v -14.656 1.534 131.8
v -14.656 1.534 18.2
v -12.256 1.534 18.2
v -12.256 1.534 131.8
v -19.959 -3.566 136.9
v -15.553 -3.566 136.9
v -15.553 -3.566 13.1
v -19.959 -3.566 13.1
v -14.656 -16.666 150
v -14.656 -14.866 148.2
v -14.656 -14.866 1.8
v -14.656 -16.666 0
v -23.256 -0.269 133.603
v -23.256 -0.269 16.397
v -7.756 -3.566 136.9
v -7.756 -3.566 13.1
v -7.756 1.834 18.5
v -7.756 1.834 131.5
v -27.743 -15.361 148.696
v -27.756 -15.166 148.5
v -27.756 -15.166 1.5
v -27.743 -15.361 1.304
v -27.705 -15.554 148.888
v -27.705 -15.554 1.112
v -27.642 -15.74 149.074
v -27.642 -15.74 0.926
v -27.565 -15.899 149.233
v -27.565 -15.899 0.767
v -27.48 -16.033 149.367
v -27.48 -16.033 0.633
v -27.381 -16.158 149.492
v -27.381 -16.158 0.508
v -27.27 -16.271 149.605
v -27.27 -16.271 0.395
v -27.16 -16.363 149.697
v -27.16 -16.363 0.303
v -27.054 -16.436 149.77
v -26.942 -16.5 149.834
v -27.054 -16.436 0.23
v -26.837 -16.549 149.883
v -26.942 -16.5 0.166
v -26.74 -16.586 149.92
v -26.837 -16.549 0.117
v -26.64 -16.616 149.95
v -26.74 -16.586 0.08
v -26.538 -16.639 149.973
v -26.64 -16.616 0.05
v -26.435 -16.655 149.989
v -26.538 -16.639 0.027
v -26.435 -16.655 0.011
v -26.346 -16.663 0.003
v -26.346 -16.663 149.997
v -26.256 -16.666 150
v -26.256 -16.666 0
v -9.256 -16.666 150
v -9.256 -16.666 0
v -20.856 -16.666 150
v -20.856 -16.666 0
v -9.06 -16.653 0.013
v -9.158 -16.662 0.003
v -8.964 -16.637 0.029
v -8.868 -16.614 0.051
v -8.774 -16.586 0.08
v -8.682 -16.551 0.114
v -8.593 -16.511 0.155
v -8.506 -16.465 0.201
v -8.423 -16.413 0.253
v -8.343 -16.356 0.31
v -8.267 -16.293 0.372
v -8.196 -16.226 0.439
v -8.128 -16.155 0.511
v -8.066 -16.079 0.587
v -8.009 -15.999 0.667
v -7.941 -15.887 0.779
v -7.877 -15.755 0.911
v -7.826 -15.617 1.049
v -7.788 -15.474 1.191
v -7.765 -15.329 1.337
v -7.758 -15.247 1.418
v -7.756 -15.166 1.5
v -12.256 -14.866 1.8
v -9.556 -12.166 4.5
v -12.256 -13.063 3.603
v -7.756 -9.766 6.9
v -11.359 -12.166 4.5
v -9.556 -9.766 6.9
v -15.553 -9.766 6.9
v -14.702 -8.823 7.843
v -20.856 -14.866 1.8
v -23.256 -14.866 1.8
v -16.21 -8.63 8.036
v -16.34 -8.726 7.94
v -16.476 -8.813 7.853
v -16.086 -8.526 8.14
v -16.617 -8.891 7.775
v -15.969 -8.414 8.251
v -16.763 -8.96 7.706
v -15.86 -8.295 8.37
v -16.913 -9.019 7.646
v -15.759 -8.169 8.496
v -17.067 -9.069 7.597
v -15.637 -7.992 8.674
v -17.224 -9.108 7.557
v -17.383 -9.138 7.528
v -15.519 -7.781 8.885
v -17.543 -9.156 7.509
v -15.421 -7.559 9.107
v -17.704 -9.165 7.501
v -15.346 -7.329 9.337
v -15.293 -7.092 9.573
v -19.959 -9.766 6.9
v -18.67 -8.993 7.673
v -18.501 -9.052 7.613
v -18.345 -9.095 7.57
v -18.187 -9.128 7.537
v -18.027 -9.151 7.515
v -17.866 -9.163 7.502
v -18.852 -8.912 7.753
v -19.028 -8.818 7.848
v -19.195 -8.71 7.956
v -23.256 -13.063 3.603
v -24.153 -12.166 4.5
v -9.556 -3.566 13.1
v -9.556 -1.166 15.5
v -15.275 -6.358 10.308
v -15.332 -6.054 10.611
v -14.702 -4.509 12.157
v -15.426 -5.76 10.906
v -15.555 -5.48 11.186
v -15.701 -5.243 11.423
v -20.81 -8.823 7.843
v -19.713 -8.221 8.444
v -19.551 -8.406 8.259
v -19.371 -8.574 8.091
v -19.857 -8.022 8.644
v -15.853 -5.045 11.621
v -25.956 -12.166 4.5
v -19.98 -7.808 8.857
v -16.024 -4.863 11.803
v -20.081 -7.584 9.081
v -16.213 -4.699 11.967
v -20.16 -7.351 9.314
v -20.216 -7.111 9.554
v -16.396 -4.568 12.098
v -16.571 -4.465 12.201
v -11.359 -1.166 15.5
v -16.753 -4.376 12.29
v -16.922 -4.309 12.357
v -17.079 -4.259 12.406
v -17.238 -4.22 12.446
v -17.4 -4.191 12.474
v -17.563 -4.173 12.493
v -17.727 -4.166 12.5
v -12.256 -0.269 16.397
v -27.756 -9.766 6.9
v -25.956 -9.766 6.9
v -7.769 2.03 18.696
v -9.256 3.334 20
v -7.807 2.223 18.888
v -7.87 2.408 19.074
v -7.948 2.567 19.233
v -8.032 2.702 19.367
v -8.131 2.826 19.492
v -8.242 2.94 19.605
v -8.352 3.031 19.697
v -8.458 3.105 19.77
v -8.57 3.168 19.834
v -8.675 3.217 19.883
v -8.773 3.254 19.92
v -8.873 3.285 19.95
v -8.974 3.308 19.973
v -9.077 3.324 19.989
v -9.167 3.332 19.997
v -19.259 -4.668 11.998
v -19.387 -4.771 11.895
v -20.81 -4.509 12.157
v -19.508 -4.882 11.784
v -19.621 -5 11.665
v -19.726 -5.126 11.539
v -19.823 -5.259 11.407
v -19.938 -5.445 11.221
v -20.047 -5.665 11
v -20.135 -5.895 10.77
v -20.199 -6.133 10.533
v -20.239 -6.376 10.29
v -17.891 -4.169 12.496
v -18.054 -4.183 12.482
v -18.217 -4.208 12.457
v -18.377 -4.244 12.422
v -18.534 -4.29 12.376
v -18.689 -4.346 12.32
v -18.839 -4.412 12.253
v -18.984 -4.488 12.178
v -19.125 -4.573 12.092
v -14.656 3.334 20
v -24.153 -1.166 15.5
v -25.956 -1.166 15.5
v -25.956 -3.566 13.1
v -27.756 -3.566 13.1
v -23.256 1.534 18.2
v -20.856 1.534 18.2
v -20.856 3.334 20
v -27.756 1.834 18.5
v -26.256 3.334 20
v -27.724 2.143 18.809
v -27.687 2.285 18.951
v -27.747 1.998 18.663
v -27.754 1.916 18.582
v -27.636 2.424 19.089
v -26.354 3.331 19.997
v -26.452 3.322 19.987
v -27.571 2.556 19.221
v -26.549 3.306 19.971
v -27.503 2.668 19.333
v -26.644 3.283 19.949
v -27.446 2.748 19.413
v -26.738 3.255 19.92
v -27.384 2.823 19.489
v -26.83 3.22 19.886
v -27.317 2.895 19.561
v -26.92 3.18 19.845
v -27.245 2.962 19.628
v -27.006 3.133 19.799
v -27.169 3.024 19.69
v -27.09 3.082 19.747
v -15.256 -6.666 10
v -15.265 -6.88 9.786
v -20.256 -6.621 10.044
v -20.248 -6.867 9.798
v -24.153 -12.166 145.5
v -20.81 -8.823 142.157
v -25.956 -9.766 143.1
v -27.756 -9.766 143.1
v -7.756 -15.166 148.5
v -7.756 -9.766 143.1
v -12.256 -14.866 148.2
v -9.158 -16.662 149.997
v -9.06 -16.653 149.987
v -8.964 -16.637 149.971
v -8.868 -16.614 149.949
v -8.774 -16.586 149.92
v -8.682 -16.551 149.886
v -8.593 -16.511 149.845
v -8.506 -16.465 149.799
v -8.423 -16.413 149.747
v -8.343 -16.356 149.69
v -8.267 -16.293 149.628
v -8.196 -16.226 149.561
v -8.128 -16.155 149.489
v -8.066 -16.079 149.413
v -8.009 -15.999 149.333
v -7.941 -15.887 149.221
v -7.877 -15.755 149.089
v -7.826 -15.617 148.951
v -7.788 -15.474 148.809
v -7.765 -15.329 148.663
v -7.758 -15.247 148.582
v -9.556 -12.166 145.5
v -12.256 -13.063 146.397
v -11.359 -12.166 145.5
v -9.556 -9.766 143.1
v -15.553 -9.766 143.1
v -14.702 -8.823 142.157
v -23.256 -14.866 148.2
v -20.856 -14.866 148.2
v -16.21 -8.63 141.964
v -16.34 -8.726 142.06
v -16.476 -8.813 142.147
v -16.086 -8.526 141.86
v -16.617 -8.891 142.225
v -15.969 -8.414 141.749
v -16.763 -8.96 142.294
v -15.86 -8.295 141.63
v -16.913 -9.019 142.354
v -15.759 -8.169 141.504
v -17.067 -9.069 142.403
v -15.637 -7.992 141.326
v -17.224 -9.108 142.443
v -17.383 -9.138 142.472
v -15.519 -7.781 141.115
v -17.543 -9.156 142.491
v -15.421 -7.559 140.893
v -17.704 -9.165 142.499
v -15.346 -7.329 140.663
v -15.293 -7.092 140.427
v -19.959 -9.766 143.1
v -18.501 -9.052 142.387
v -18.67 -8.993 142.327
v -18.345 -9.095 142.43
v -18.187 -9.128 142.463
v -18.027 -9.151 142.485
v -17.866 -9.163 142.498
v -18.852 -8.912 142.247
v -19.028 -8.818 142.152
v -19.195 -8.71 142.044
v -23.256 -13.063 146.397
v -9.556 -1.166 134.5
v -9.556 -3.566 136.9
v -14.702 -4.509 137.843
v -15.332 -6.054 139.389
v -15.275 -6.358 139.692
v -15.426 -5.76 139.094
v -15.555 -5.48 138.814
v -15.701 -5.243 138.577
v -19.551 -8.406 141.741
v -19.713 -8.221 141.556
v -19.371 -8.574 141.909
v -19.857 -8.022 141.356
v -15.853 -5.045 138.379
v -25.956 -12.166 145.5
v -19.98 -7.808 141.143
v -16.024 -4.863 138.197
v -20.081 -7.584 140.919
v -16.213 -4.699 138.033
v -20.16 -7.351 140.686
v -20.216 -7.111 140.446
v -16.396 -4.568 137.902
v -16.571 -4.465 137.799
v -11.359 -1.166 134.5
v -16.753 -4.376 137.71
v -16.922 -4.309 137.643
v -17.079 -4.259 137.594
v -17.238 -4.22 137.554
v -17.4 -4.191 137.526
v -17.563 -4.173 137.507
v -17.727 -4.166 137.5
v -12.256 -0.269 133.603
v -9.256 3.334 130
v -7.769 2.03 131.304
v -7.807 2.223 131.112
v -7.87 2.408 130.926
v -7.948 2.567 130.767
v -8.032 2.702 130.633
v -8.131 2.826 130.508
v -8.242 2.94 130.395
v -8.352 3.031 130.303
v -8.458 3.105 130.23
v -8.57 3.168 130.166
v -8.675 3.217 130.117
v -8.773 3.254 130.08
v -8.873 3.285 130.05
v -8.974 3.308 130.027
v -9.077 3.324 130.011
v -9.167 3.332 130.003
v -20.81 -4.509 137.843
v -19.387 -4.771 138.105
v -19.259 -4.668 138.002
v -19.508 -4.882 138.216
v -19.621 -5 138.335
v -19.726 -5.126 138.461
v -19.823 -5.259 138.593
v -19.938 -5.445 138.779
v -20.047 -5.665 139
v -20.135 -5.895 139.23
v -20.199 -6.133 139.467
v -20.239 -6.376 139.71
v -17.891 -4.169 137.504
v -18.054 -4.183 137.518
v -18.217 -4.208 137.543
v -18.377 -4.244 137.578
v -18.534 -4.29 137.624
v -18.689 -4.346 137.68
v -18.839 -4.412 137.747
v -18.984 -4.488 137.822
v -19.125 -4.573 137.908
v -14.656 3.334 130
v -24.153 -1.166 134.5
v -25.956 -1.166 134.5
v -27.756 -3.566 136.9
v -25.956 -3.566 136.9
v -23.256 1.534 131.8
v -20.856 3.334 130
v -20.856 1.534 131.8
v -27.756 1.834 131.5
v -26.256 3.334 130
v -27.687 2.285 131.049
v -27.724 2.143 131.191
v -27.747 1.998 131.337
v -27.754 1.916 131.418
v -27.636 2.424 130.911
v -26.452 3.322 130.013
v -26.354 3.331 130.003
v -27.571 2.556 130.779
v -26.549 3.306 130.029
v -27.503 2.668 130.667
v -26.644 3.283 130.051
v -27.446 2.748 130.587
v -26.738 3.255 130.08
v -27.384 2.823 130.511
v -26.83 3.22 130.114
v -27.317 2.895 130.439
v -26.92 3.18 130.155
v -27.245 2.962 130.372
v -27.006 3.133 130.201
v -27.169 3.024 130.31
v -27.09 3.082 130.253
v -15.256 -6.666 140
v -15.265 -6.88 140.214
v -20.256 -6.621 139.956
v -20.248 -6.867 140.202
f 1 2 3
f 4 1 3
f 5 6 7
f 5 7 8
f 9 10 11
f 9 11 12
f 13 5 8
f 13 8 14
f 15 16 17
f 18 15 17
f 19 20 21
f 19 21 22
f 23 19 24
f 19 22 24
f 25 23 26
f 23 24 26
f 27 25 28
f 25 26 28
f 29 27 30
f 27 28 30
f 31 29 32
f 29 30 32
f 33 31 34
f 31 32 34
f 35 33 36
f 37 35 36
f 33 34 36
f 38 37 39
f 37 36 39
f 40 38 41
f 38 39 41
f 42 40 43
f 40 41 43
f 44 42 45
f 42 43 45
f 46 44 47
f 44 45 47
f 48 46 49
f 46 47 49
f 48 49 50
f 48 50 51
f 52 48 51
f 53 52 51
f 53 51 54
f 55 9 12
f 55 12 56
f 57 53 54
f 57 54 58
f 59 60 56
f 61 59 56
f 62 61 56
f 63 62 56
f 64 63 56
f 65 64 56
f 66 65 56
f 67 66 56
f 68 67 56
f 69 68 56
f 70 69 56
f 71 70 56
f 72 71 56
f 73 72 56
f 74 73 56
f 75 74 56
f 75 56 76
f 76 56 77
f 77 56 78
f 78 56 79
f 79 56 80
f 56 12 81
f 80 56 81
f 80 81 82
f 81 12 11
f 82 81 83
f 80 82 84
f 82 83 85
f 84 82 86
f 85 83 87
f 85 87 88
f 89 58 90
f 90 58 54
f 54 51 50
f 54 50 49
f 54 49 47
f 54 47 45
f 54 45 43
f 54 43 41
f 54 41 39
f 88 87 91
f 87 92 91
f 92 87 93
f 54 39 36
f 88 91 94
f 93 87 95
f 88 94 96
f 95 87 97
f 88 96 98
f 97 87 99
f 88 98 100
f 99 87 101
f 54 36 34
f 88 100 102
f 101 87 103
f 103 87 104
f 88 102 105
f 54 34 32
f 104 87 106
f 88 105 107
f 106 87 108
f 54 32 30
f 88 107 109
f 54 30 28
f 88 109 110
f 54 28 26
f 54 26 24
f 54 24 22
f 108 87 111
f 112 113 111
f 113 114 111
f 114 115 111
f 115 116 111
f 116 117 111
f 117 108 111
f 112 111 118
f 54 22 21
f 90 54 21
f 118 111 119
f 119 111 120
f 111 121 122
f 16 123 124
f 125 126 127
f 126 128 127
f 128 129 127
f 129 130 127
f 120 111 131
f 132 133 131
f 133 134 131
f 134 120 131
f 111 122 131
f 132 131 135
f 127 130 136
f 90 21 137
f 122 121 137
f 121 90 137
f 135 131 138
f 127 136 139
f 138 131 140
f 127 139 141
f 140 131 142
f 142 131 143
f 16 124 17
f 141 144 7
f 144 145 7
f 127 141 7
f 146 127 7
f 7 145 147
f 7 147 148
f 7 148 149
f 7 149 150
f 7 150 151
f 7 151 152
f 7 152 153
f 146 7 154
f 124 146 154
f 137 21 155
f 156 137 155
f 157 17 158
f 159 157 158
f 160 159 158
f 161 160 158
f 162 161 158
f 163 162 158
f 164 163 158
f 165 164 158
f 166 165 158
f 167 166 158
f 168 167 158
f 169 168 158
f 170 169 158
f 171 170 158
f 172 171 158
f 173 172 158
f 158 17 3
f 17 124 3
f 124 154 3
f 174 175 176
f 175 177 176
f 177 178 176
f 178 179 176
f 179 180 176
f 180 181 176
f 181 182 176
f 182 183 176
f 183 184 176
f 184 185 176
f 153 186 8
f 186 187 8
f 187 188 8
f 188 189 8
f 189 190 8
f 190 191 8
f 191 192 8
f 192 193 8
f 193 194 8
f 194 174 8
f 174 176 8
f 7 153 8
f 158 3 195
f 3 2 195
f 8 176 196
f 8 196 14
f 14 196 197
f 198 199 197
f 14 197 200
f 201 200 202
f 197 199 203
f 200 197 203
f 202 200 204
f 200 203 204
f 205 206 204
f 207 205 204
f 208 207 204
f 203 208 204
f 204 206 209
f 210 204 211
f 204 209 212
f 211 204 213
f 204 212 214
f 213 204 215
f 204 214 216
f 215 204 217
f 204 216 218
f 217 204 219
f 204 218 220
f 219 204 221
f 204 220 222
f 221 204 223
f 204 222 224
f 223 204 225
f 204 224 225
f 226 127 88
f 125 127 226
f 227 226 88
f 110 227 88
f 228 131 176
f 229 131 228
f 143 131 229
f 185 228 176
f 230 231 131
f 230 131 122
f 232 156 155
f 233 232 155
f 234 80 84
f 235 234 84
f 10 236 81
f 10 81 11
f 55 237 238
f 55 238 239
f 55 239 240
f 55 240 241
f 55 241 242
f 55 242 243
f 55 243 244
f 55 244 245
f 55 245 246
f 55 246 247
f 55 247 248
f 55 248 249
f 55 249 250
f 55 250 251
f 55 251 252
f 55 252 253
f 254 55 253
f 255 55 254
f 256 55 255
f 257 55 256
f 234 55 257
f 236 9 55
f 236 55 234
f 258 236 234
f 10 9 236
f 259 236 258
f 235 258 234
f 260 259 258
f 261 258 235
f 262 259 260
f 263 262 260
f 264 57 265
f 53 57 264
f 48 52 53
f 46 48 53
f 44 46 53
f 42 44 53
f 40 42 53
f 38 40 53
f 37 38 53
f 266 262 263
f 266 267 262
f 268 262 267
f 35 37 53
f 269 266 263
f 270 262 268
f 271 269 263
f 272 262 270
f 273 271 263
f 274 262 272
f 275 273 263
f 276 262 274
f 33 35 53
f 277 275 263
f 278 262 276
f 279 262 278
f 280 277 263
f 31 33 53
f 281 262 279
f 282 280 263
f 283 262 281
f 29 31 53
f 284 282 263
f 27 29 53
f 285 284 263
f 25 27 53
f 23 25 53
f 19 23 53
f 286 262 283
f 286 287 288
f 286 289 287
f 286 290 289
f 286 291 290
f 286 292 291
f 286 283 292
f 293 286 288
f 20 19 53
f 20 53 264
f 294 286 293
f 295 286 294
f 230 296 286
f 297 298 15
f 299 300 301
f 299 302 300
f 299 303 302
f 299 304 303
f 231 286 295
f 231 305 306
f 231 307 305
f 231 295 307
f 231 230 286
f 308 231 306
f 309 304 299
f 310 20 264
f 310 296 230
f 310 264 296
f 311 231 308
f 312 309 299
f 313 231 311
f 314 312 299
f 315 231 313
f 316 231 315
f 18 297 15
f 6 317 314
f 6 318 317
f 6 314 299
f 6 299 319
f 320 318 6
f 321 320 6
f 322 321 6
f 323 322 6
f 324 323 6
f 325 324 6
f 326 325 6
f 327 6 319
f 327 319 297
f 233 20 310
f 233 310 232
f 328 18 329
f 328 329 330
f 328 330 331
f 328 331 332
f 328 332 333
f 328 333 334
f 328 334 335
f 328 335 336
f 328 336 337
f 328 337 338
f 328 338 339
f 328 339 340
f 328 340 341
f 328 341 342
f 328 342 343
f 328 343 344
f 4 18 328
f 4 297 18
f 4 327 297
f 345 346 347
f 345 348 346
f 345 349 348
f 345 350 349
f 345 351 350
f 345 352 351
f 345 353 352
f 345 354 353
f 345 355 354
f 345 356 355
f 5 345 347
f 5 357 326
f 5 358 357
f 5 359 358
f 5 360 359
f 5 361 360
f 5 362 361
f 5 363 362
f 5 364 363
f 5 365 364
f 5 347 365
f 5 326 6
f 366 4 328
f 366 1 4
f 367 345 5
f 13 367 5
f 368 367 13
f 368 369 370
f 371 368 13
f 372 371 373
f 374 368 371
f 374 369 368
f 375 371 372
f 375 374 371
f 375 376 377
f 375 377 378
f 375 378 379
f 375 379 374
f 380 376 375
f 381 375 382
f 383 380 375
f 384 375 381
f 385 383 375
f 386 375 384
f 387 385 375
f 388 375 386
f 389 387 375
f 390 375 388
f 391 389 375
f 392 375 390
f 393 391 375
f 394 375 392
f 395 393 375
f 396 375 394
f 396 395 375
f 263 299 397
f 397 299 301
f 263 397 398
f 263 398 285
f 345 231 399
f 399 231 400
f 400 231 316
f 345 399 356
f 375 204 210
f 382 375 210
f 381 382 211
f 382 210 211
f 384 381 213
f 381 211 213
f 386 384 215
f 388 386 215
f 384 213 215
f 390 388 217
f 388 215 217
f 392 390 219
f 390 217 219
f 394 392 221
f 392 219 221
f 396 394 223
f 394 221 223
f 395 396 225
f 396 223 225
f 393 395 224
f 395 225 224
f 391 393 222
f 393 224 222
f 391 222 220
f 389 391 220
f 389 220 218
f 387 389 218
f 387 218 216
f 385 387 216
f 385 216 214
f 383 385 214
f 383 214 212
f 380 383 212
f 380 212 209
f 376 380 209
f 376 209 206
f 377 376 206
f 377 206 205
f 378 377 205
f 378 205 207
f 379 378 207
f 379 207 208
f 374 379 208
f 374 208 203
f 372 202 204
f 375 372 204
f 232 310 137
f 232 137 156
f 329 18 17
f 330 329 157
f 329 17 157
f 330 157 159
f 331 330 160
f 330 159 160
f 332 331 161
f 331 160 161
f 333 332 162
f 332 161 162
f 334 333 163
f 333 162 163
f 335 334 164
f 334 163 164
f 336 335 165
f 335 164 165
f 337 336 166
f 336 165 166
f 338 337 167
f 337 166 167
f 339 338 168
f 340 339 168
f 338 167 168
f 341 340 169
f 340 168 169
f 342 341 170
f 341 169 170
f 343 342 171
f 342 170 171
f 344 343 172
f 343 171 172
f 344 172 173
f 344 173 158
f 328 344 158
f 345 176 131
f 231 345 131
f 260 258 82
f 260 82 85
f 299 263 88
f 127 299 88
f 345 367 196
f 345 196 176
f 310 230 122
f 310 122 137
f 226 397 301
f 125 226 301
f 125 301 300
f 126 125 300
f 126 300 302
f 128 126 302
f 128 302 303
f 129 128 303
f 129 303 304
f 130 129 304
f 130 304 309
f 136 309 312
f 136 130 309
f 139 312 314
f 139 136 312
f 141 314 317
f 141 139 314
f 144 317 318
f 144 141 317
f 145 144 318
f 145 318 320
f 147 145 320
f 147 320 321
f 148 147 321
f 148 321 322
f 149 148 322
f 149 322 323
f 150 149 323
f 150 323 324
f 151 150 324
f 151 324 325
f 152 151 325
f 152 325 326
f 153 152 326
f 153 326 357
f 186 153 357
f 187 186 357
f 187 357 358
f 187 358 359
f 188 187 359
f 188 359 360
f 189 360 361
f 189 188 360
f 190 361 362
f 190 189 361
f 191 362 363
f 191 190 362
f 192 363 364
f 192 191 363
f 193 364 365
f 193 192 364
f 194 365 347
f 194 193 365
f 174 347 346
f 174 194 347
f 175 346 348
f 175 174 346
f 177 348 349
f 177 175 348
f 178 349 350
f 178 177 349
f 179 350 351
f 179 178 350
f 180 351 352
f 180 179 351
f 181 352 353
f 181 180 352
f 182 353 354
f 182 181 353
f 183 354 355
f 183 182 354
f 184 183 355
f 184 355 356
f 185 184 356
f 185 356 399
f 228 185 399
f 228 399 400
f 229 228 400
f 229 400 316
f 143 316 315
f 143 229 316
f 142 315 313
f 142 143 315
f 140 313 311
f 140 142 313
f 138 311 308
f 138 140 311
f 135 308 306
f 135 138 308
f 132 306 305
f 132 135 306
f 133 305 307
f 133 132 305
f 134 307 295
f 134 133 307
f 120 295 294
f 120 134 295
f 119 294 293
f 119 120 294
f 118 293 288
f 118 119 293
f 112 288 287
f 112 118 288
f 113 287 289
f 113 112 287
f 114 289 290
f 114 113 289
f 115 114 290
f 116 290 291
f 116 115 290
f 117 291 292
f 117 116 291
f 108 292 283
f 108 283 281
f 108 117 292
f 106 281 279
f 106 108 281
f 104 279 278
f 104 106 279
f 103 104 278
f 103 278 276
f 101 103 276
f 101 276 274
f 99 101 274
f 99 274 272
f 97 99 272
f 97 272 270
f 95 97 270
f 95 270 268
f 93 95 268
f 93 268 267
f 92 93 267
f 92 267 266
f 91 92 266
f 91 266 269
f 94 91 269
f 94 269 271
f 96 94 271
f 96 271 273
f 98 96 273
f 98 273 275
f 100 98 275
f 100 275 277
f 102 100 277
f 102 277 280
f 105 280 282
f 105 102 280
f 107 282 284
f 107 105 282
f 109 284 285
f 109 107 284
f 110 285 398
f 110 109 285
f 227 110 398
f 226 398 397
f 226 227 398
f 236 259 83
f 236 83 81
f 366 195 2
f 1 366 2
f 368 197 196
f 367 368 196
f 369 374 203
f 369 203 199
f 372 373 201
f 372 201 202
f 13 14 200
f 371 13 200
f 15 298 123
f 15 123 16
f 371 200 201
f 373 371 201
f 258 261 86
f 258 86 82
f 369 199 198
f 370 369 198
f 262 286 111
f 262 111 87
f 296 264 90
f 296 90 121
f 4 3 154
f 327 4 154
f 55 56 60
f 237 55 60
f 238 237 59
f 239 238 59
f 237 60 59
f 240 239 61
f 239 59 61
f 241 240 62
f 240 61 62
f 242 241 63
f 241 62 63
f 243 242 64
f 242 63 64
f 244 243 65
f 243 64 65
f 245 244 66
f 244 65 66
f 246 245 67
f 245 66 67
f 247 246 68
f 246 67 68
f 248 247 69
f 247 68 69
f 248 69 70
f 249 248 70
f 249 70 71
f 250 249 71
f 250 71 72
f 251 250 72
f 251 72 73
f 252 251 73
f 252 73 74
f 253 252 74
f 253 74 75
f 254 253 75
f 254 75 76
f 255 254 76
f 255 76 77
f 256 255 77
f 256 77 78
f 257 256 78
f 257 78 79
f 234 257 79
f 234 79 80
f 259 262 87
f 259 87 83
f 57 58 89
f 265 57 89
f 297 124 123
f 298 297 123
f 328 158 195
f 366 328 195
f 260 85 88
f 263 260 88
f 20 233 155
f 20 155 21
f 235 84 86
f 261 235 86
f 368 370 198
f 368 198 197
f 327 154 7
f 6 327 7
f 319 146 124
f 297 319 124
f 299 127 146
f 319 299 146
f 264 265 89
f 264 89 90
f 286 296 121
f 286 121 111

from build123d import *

# Parameters (mm, degrees)
SKETCH_1_R          = 2.5
EXTRUDE_1_DEPTH     = 150
CUT_EXTRUDE_1_DEPTH = 153.242379078


with BuildPart() as part:
    # 草图1 → 凸台-拉伸1 (new body)
    with BuildSketch(Plane.XY):
        with BuildLine():
            Line((-25.95624704, -9.765592916), (-27.75624704, -9.765592916))
            Line((-27.75624704, -9.765592916), (-27.75624704, -15.165592916))
            ThreePointArc((-27.75624704, -15.165592916), (-27.316907212, -16.226253087), (-26.25624704, -16.665592916))
            Line((-26.25624704, -16.665592916), (-20.85624704, -16.665592916))
            Line((-20.85624704, -16.665592916), (-20.85624704, -14.865592916))
            Line((-20.85624704, -14.865592916), (-23.25624704, -14.865592916))
            Line((-23.25624704, -14.865592916), (-23.25624704, -13.062643071))
            Line((-23.25624704, -13.062643071), (-19.959196885, -9.765592916))
            Line((-19.959196885, -9.765592916), (-15.553297195, -9.765592916))
            Line((-15.553297195, -9.765592916), (-12.25624704, -13.062643071))
            Line((-12.25624704, -13.062643071), (-12.25624704, -14.865592916))
            Line((-12.25624704, -14.865592916), (-14.65624704, -14.865592916))
            Line((-14.65624704, -14.865592916), (-14.65624704, -16.665592916))
            Line((-14.65624704, -16.665592916), (-9.25624704, -16.665592916))
            ThreePointArc((-9.25624704, -16.665592916), (-8.195586868, -16.226253087), (-7.75624704, -15.165592916))
            Line((-7.75624704, -15.165592916), (-7.75624704, -9.765592916))
            Line((-7.75624704, -9.765592916), (-9.55624704, -9.765592916))
            Line((-9.55624704, -9.765592916), (-9.55624704, -12.165592916))
            Line((-9.55624704, -12.165592916), (-11.359196885, -12.165592916))
            Line((-11.359196885, -12.165592916), (-14.70212002, -8.822669781))
            Line((-14.70212002, -8.822669781), (-14.70212002, -4.50851605))
            Line((-14.70212002, -4.50851605), (-11.359196885, -1.165592916))
            Line((-11.359196885, -1.165592916), (-9.55624704, -1.165592916))
            Line((-9.55624704, -1.165592916), (-9.55624704, -3.565592916))
            Line((-9.55624704, -3.565592916), (-7.75624704, -3.565592916))
            Line((-7.75624704, -3.565592916), (-7.75624704, 1.834407084))
            ThreePointArc((-7.75624704, 1.834407084), (-8.195586868, 2.895067256), (-9.25624704, 3.334407084))
            Line((-9.25624704, 3.334407084), (-14.65624704, 3.334407084))
            Line((-14.65624704, 3.334407084), (-14.65624704, 1.534407084))
            Line((-14.65624704, 1.534407084), (-12.25624704, 1.534407084))
            Line((-12.25624704, 1.534407084), (-12.25624704, -0.26854276))
            Line((-12.25624704, -0.26854276), (-15.553297195, -3.565592916))
            Line((-15.553297195, -3.565592916), (-19.959196885, -3.565592916))
            Line((-19.959196885, -3.565592916), (-23.25624704, -0.26854276))
            Line((-23.25624704, -0.26854276), (-23.25624704, 1.534407084))
            Line((-23.25624704, 1.534407084), (-20.85624704, 1.534407084))
            Line((-20.85624704, 1.534407084), (-20.85624704, 3.334407084))
            Line((-20.85624704, 3.334407084), (-26.25624704, 3.334407084))
            ThreePointArc((-26.25624704, 3.334407084), (-27.316907212, 2.895067256), (-27.75624704, 1.834407084))
            Line((-27.75624704, 1.834407084), (-27.75624704, -3.565592916))
            Line((-27.75624704, -3.565592916), (-25.95624704, -3.565592916))
            Line((-25.95624704, -3.565592916), (-25.95624704, -1.165592916))
            Line((-25.95624704, -1.165592916), (-24.153297195, -1.165592916))
            Line((-24.153297195, -1.165592916), (-20.81037406, -4.50851605))
            Line((-20.81037406, -4.50851605), (-20.81037406, -8.822669781))
            Line((-20.81037406, -8.822669781), (-24.153297195, -12.165592916))
            Line((-24.153297195, -12.165592916), (-25.95624704, -12.165592916))
            Line((-25.95624704, -12.165592916), (-25.95624704, -9.765592916))
        make_face()
        with Locations((-17.75624704, -6.665592916)):
            Circle(SKETCH_1_R, mode=Mode.SUBTRACT)
    extrude(amount=EXTRUDE_1_DEPTH)

    # 草图2 → 切除-拉伸1 (cut, through all)
    with BuildSketch(Plane.ZY.offset(27.75624704)):
        Polygon((0, -16.665592916), (20, 3.334407084), (0, 3.334407084), align=None)
        Polygon((150, -16.665592916), (130, 3.334407084), (150, 3.334407084), align=None)
    extrude(amount=-CUT_EXTRUDE_1_DEPTH, mode=Mode.SUBTRACT)


solid = part.part
